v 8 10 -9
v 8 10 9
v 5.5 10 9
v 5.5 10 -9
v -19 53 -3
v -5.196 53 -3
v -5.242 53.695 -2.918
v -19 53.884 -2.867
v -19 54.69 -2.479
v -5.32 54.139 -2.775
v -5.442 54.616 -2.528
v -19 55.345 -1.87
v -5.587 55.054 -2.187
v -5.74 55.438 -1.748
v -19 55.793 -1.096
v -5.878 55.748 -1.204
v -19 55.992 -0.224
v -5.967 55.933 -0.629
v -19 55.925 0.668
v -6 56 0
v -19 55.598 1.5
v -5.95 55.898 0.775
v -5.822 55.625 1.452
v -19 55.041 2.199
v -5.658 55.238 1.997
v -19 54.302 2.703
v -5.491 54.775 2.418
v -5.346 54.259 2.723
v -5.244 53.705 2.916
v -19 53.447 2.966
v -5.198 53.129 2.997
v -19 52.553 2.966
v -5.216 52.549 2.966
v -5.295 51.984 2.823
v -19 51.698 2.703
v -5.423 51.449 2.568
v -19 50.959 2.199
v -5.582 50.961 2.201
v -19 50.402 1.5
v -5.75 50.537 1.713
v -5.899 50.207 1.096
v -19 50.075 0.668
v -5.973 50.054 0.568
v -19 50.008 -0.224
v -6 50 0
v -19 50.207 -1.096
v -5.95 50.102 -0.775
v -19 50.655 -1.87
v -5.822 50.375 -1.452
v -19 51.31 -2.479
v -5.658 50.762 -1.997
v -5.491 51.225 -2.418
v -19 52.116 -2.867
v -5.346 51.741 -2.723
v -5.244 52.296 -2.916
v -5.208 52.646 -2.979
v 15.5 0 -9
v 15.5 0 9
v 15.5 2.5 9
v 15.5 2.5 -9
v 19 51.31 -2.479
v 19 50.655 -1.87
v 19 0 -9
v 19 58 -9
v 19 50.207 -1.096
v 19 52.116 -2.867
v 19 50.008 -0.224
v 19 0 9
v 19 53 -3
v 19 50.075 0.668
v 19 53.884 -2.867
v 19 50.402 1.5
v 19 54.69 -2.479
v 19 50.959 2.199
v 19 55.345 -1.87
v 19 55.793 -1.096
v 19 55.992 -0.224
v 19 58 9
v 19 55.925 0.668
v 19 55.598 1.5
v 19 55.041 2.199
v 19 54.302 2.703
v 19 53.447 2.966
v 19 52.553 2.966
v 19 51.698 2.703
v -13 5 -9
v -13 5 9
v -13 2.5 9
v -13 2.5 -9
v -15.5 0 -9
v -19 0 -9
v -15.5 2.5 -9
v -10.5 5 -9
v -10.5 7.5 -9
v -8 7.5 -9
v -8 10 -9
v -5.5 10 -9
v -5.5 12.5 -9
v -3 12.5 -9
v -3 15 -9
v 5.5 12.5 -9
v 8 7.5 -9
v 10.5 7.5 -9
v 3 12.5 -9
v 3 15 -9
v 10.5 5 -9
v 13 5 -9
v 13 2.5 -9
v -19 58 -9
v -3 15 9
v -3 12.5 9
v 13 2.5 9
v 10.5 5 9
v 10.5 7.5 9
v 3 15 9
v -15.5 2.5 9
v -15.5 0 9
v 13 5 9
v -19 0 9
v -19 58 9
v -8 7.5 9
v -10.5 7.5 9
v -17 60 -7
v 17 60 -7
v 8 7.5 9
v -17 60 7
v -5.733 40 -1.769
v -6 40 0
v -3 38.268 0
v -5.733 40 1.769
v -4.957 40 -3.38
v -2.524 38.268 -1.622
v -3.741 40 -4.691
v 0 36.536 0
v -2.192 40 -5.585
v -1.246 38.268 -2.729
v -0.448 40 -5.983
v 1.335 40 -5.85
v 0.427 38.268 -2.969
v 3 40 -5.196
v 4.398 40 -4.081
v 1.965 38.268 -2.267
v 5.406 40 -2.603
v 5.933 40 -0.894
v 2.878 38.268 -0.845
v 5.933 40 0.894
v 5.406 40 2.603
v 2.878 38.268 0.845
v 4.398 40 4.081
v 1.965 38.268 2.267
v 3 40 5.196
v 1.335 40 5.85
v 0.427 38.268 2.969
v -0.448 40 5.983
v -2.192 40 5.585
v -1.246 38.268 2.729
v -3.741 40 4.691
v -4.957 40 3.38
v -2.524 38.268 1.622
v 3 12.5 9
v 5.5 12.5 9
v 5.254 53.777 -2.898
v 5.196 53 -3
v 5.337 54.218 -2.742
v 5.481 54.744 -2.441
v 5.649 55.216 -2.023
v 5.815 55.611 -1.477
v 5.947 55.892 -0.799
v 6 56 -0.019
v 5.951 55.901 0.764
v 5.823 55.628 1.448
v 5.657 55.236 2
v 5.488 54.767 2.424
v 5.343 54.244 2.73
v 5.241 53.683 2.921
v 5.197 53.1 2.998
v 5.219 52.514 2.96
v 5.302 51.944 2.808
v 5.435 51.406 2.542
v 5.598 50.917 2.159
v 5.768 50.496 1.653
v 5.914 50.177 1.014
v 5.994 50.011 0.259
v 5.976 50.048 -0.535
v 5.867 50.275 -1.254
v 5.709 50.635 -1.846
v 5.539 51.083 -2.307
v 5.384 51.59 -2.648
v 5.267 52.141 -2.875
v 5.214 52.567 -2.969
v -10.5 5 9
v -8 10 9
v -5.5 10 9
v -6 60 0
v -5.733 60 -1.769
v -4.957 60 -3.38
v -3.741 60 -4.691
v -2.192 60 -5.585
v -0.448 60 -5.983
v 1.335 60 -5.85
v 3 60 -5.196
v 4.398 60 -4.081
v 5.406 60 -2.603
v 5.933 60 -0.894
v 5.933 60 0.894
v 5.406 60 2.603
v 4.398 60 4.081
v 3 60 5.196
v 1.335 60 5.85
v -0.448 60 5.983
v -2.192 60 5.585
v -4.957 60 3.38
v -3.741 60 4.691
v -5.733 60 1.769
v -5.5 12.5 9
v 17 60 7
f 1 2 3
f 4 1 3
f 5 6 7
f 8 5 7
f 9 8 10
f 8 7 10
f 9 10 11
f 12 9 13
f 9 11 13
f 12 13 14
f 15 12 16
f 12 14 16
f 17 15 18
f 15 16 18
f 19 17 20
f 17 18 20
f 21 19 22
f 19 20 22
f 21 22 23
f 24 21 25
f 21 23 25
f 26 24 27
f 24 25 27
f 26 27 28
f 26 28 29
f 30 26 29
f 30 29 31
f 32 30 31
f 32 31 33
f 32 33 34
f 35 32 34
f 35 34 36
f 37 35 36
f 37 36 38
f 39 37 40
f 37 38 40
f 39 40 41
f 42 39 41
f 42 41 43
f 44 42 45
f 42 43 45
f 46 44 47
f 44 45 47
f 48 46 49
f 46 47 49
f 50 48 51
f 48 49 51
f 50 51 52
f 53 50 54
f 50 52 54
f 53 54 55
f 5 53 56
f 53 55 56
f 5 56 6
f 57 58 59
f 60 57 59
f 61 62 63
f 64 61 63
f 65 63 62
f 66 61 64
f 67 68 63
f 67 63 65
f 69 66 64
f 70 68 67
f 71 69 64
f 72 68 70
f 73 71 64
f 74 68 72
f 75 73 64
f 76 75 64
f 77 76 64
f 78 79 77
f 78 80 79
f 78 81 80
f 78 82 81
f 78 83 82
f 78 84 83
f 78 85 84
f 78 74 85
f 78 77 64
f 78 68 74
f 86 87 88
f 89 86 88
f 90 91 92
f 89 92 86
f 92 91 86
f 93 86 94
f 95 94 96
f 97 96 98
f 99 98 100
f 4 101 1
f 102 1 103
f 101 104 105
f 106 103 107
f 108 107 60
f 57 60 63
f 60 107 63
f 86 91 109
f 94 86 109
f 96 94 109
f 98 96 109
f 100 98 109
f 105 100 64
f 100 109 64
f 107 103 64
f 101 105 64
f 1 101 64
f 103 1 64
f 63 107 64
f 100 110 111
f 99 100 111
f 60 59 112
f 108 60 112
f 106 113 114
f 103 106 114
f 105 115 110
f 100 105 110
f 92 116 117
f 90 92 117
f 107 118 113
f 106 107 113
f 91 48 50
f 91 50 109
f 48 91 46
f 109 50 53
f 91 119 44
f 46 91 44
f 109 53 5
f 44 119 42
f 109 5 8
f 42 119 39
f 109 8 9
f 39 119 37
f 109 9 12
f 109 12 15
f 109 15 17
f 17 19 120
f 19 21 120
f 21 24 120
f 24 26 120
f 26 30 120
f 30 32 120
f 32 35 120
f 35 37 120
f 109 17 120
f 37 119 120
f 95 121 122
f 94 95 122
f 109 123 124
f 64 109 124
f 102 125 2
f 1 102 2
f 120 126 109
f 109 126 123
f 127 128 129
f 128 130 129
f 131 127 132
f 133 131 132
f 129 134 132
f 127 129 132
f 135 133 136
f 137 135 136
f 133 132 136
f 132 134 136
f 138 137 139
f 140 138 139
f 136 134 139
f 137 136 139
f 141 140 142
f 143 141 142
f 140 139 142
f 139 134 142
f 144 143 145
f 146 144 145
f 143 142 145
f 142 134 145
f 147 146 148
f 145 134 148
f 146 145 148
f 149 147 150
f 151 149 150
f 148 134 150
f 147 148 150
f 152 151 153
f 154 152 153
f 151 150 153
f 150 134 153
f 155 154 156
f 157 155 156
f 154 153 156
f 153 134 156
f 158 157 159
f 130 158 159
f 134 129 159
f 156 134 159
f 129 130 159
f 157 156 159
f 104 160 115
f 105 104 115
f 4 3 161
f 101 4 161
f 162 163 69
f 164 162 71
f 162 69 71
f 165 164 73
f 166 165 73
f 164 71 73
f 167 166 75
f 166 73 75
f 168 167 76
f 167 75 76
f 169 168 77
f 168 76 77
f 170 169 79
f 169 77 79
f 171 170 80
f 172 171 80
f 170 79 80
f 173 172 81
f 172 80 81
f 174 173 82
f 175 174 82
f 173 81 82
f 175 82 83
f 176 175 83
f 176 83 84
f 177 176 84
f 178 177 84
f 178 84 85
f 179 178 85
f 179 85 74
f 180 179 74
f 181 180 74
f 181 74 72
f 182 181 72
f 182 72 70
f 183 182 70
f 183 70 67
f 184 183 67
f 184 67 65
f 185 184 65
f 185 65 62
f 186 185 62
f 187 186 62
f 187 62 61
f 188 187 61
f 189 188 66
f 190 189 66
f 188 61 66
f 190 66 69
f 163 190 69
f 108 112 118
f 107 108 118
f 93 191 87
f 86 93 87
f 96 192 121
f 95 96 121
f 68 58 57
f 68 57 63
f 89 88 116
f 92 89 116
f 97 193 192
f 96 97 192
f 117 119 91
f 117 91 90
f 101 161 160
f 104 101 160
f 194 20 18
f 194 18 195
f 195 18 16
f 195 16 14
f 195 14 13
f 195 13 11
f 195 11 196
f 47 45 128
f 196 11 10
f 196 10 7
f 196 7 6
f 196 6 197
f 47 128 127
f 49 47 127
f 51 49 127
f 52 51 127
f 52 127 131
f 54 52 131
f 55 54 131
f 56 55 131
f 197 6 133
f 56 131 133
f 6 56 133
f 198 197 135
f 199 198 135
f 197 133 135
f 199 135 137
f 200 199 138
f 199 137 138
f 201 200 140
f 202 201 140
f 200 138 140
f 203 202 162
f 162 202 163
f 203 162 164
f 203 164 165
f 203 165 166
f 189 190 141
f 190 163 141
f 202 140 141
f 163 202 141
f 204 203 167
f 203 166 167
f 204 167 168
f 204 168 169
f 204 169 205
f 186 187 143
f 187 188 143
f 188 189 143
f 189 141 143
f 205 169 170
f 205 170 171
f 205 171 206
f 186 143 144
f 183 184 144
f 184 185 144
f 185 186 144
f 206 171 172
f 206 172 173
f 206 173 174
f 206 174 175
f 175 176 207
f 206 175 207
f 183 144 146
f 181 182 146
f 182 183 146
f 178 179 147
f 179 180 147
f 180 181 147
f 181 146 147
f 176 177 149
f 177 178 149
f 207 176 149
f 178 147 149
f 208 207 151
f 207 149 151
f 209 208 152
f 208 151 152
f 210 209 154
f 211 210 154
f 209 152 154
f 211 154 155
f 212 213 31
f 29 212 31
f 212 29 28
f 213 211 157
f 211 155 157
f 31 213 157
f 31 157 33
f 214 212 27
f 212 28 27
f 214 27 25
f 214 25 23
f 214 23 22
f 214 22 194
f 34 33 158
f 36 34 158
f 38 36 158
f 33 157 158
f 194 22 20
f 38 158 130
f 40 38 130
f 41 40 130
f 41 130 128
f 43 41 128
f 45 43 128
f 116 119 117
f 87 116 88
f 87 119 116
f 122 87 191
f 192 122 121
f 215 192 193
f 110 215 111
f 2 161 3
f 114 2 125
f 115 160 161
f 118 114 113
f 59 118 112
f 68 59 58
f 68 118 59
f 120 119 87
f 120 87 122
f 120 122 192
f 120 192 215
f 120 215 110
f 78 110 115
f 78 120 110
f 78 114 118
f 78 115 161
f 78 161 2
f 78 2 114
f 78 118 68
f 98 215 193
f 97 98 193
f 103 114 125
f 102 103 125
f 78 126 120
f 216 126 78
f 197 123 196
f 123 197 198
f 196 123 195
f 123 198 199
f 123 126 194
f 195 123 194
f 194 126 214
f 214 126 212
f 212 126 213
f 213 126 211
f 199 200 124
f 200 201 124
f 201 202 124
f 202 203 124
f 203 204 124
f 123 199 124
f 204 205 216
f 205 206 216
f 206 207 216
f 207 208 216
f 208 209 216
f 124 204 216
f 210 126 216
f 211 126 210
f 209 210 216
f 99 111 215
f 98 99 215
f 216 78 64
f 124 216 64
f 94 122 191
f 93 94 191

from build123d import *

# Parameters (mm, degrees)
SKETCH1_W               = 38
SKETCH1_H               = 60
BOSS_EXTRUDE1_DEPTH     = 9
CUT_EXTRUDE1_DEPTH      = 1
CUT_EXTRUDE1_DEPTH_BACK = 18
SKETCH5_R               = 3
CUT_EXTRUDE2_DEPTH      = 38
CHAMFER1_SIZE           = 2


with BuildPart() as part:
    # Sketch1 → Boss-Extrude1 (new body, symmetric)
    with BuildSketch(Plane.XY):
        with Locations((0, 30)):
            Rectangle(SKETCH1_W, SKETCH1_H)
    extrude(amount=BOSS_EXTRUDE1_DEPTH, both=True)

    # Sketch2 → Cut-Extrude1 (cut, two sides)
    with BuildSketch(Plane.XY.offset(9)) as cut_extrude1_sk:
        Polygon((-15.5, 2.5), (-15.5, 0), (15.5, 0), (15.5, 2.5), (13, 2.5), (13, 5), (10.5, 5), (10.5, 7.5), (8, 7.5), (8, 10), (5.5, 10), (5.5, 12.5), (3, 12.5), (3, 15), (-3, 15), (-3, 12.5), (-5.5, 12.5), (-5.5, 10), (-8, 10), (-8, 7.5), (-10.5, 7.5), (-10.5, 5), (-13, 5), (-13, 2.5), align=None)
    extrude(amount=CUT_EXTRUDE1_DEPTH, mode=Mode.SUBTRACT)
    extrude(cut_extrude1_sk.sketch, amount=-CUT_EXTRUDE1_DEPTH_BACK, mode=Mode.SUBTRACT)

    # Sketch4 → Cut-Revolve1 (revolve, cut)
    with BuildSketch(Plane.XY):
        Polygon((-6, 60), (-6, 40), (0, 36.535898385), (0, 60), align=None)
    revolve(axis=Axis((0, 73.07179677, 0), (0, -1, 0)), mode=Mode.SUBTRACT)

    # Sketch5 → Cut-Extrude2 (cut)
    with BuildSketch(Plane(origin=(19, 0, 0), x_dir=(0, 0, -1), z_dir=(1, 0, 0))):
        with Locations((0, 53)):
            Circle(SKETCH5_R)
    extrude(amount=-CUT_EXTRUDE2_DEPTH, mode=Mode.SUBTRACT)

    # Chamfer1
    chamfer1_edges = [part.edges().sort_by_distance(p)[0] for p in [
        (0, 60, 9),
        (0, 60, -9),
        (-19, 60, 0),
        (19, 60, 0),
    ]]
    chamfer(chamfer1_edges, length=CHAMFER1_SIZE)


solid = part.part
